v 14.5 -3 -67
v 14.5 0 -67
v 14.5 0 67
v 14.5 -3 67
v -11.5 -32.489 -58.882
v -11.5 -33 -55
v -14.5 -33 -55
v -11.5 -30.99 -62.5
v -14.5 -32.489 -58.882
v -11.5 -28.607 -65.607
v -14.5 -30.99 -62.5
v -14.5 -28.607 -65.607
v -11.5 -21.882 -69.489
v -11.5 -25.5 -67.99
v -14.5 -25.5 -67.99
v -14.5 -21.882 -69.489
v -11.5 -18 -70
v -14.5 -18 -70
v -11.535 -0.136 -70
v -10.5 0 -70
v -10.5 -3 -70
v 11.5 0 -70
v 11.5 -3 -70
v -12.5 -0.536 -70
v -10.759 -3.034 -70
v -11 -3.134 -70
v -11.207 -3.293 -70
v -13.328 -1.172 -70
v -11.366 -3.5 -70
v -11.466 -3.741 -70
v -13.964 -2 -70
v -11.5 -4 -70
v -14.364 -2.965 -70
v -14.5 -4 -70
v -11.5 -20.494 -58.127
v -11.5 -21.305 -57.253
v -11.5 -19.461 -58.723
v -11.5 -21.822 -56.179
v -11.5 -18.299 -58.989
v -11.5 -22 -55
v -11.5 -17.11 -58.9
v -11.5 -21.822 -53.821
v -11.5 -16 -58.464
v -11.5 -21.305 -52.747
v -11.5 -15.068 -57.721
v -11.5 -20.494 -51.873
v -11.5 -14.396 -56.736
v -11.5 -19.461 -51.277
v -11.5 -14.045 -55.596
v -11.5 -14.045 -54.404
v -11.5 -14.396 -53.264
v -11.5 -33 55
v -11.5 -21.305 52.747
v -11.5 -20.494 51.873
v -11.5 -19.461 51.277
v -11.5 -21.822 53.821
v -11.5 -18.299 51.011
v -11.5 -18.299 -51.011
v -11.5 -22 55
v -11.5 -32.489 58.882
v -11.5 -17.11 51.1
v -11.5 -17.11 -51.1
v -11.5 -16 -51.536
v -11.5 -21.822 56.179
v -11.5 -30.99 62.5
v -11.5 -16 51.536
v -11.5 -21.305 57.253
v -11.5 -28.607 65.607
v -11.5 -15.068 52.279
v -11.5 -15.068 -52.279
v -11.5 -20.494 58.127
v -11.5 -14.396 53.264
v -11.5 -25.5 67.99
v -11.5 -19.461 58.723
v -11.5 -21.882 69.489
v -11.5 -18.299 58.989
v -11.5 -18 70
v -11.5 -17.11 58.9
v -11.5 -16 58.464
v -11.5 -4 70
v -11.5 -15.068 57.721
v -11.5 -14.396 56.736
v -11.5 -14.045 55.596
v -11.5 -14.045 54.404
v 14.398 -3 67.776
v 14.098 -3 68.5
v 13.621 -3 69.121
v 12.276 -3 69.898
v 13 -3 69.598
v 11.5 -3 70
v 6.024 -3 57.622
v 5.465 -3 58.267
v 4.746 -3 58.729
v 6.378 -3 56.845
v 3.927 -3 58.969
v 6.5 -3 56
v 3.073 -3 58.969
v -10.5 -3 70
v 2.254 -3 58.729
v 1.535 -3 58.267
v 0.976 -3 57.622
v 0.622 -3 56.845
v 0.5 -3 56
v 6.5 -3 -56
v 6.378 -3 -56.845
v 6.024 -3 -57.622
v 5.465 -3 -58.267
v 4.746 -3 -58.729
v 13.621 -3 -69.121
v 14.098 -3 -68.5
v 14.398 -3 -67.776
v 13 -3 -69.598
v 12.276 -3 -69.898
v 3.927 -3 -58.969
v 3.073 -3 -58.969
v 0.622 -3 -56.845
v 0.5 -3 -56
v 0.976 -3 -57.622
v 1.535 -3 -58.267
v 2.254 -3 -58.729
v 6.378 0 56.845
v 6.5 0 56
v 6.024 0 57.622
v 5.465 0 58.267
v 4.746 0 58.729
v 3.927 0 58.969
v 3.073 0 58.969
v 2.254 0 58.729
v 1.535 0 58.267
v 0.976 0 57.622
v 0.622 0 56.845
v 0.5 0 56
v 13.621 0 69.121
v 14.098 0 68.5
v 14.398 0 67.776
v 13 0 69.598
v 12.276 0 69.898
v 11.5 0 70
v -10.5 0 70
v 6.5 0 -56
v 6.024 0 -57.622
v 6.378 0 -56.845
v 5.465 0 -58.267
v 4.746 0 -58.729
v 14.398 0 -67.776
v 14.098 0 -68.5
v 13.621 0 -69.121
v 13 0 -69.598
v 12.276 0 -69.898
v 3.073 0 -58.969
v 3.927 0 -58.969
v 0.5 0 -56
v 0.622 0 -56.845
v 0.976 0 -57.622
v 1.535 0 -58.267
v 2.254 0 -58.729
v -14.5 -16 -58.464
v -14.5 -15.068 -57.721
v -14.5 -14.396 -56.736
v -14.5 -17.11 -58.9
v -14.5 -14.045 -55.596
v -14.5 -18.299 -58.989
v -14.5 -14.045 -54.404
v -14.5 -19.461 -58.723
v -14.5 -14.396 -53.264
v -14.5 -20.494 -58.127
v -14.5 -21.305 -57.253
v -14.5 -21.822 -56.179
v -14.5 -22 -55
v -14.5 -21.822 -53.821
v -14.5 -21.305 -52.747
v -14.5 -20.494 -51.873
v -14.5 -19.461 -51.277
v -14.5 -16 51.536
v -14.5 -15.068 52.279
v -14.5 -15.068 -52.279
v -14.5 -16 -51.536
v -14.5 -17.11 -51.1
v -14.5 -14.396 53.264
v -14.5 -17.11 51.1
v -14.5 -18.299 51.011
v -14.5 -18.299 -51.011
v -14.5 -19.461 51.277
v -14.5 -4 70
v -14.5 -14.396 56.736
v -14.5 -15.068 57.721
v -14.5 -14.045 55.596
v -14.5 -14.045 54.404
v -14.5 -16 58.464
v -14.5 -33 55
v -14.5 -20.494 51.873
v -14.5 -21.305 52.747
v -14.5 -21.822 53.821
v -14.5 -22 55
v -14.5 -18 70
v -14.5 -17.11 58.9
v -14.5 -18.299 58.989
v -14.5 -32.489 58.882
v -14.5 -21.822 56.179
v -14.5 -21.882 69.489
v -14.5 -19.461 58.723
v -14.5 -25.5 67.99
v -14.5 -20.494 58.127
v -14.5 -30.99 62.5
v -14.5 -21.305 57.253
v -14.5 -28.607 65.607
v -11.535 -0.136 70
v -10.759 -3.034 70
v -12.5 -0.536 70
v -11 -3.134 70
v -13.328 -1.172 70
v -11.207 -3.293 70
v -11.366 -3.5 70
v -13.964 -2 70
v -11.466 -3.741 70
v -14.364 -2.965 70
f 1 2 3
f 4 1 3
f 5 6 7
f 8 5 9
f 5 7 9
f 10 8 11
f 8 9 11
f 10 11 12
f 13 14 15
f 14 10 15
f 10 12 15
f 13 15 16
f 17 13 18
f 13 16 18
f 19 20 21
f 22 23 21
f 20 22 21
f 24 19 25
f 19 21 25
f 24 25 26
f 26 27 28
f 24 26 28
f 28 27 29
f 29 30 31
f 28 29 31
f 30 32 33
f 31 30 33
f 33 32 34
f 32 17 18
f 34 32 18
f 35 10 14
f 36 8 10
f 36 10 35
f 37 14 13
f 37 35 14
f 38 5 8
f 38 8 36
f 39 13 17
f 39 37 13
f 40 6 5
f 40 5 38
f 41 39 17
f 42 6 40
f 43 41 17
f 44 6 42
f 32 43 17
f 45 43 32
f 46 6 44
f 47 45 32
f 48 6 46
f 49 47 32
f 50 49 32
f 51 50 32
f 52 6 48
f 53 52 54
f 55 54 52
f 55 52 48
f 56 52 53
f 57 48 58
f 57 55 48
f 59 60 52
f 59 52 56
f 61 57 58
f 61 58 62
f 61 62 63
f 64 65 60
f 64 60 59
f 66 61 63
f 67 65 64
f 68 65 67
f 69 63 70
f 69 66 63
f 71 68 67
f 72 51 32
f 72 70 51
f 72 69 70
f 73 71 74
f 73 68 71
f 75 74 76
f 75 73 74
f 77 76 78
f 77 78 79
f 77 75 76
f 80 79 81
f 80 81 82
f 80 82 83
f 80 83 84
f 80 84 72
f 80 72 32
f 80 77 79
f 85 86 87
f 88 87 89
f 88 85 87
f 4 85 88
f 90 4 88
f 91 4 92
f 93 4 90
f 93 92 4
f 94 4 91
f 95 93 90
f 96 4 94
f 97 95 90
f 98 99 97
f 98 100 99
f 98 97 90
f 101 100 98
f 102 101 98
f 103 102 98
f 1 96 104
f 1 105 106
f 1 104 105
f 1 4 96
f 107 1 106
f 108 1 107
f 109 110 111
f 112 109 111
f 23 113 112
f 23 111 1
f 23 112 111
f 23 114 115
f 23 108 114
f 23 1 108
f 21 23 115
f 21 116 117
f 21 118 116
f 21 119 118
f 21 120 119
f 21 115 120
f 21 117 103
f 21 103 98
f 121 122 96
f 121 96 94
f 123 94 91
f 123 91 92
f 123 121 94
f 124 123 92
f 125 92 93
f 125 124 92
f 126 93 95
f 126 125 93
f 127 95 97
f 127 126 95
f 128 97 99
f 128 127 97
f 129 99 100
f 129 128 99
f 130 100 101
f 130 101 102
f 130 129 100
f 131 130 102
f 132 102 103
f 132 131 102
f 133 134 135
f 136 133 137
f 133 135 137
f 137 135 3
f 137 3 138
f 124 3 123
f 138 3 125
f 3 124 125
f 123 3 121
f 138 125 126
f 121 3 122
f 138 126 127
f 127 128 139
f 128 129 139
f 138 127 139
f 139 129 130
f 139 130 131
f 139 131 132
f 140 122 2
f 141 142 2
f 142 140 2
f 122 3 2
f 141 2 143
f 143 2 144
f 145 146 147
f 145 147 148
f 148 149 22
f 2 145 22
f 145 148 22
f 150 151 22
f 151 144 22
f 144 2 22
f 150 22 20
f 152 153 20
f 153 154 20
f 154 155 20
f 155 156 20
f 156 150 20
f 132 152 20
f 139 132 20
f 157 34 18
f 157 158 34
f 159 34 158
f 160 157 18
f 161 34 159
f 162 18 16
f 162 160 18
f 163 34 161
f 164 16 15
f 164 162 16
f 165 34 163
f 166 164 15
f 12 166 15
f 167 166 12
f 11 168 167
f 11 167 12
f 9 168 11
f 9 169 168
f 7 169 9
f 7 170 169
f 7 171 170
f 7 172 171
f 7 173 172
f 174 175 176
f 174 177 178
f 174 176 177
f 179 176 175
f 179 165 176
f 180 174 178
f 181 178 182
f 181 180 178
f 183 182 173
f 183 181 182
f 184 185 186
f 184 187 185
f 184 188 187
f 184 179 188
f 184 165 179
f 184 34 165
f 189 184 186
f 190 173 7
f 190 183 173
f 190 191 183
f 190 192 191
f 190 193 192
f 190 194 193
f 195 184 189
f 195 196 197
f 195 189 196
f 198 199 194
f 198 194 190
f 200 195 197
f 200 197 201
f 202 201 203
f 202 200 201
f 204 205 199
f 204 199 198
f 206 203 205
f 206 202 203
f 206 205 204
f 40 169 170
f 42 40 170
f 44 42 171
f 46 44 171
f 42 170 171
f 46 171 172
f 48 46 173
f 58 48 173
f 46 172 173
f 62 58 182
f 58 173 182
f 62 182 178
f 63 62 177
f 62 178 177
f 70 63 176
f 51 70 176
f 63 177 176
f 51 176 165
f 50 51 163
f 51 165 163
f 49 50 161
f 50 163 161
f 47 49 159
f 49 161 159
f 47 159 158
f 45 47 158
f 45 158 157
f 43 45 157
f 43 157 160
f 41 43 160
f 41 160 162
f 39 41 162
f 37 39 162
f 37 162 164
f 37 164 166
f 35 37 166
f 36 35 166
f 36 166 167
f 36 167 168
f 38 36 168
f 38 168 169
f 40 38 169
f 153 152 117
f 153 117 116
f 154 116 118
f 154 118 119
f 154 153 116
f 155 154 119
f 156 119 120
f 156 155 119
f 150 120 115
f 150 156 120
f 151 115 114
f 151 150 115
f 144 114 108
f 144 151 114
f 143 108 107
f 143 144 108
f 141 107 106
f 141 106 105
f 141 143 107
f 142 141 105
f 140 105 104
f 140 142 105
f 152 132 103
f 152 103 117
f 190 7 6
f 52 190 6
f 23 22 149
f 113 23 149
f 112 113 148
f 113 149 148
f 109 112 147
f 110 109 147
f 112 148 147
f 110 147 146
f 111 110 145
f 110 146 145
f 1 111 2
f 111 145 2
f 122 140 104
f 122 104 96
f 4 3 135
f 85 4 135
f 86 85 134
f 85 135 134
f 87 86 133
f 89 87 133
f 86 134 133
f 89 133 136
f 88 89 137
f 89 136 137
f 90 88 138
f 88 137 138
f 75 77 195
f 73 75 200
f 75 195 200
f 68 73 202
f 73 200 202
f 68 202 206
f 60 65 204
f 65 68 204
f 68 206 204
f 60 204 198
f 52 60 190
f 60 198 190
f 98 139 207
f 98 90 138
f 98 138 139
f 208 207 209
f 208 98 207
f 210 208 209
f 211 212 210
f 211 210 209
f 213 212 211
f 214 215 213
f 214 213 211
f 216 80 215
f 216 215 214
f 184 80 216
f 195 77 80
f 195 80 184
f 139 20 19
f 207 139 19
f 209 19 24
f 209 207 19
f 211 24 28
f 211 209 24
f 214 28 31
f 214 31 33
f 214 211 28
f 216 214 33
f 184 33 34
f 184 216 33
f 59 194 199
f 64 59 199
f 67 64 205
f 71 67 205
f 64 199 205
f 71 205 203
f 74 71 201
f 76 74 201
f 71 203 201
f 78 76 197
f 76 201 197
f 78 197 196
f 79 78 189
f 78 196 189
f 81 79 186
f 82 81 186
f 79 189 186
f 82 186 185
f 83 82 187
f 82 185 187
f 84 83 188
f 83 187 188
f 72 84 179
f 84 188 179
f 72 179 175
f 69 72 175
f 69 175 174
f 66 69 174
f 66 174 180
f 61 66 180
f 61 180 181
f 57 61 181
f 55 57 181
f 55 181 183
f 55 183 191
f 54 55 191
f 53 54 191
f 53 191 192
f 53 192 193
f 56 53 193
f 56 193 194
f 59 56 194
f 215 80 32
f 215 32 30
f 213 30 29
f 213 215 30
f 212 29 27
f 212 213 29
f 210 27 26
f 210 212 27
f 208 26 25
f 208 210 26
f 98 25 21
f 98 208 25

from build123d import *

# Parameters (mm, degrees)
BASE_FLANGE1_DEPTH           = 3
EDGE_FLANGE1_STRIP_W         = 14
EDGE_FLANGE1_STRIP_H         = 3
EDGE_FLANGE1_STRIP_CUT_DEPTH = 140
EDGE_FLANGE1_DEPTH           = 140
CUT_EXTRUDE1_REACH           = 84.644
SKETCH10_R                   = 4


# Sheet-metal steps are written as plain solids
with BuildPart() as part:
    # Sketch1 → Base-Flange1 (new body)
    with BuildSketch(Plane(origin=(0, 0, 0), x_dir=(1, 0, 0), z_dir=(0, 1, 0))):
        with BuildLine():
            Line((-14.5, 70), (11.5, 70))
            ThreePointArc((11.5, 70), (13.621320344, 69.121320344), (14.5, 67))
            Line((14.5, 67), (14.5, -67))
            ThreePointArc((14.5, -67), (13.621320344, -69.121320344), (11.5, -70))
            Line((11.5, -70), (-14.5, -70))
            Line((-14.5, -70), (-14.5, 70))
        make_face()
        with BuildLine():
            Line((6.5, 56), (6.5, -56))
            ThreePointArc((6.5, -56), (3.5, -59), (0.5, -56))
            Line((0.5, -56), (0.5, 56))
            ThreePointArc((0.5, 56), (3.5, 59), (6.5, 56))
        make_face(mode=Mode.SUBTRACT)
    extrude(amount=-BASE_FLANGE1_DEPTH)

    # Edge-Flange1 strip (across the edge) → Edge-Flange1 strip cut (cut)
    with BuildSketch(Plane(origin=(-14.5, -3, 70), x_dir=(1, 0, 0), z_dir=(0, 0, -1))):
        with Locations((-3, -1.5)):
            Rectangle(EDGE_FLANGE1_STRIP_W, EDGE_FLANGE1_STRIP_H)
    extrude(amount=EDGE_FLANGE1_STRIP_CUT_DEPTH, mode=Mode.SUBTRACT)

    # Edge-Flange1 section (across the edge) → Edge-Flange1 (add)
    with BuildSketch(Plane(origin=(-14.5, -3, 70), x_dir=(1, 0, 0), z_dir=(0, 0, -1))):
        with BuildLine():
            Line((0, 1), (0, 30))
            Line((0, 30), (3, 30))
            Line((3, 30), (3, 1))
            ThreePointArc((3, 1), (3.292893219, 0.292893219), (4, 0))
            Line((4, 0), (4, -3))
            ThreePointArc((4, -3), (1.171572875, -1.828427125), (0, 1))
        make_face()
    extrude(amount=EDGE_FLANGE1_DEPTH)

    # Sketch10 → Cut-Extrude1 (cut, up to next)
    with BuildSketch(Plane.ZY.offset(14.5), mode=Mode.PRIVATE) as cut_extrude1_sk1:
        with BuildLine():
            ThreePointArc((-55, -33), (-65.606601718, -28.606601718), (-70, -18))
            Line((-70, -18), (-70, -33))
            Line((-70, -33), (-55, -33))
        make_face()
    cut_extrude1_tool1 = extrude(cut_extrude1_sk1.sketch, amount=-CUT_EXTRUDE1_REACH, mode=Mode.PRIVATE) & part.part
    # Sketch10 → Cut-Extrude1 (cut, up to next)
    with BuildSketch(Plane.ZY.offset(14.5), mode=Mode.PRIVATE) as cut_extrude1_sk2:
        with BuildLine():
            Line((55, -33), (70, -33))
            Line((70, -33), (70, -18))
            ThreePointArc((70, -18), (65.606601718, -28.606601718), (55, -33))
        make_face()
    cut_extrude1_tool2 = extrude(cut_extrude1_sk2.sketch, amount=-CUT_EXTRUDE1_REACH, mode=Mode.PRIVATE) & part.part
    # Sketch10 → Cut-Extrude1 (cut, up to next)
    with BuildSketch(Plane.ZY.offset(14.5), mode=Mode.PRIVATE) as cut_extrude1_sk3:
        with Locations(Location((-55, -18, 0), (0, 0, 270))):
            Circle(SKETCH10_R)
    cut_extrude1_tool3 = extrude(cut_extrude1_sk3.sketch, amount=-CUT_EXTRUDE1_REACH, mode=Mode.PRIVATE) & part.part
    # Sketch10 → Cut-Extrude1 (cut, up to next)
    with BuildSketch(Plane.ZY.offset(14.5), mode=Mode.PRIVATE) as cut_extrude1_sk4:
        with Locations(Location((55, -18, 0), (0, 0, 270))):
            Circle(SKETCH10_R)
    cut_extrude1_tool4 = extrude(cut_extrude1_sk4.sketch, amount=-CUT_EXTRUDE1_REACH, mode=Mode.PRIVATE) & part.part
    add(cut_extrude1_tool1.solids().sort_by_distance((-14.5, -29.649481, -66.649481))[0], mode=Mode.SUBTRACT)
    add(cut_extrude1_tool2.solids().sort_by_distance((-14.5, -29.649481, 66.649481))[0], mode=Mode.SUBTRACT)
    add(cut_extrude1_tool3.solids().sort_by_distance((-14.5, -18, -55))[0], mode=Mode.SUBTRACT)
    add(cut_extrude1_tool4.solids().sort_by_distance((-14.5, -18, 55))[0], mode=Mode.SUBTRACT)


solid = part.part
